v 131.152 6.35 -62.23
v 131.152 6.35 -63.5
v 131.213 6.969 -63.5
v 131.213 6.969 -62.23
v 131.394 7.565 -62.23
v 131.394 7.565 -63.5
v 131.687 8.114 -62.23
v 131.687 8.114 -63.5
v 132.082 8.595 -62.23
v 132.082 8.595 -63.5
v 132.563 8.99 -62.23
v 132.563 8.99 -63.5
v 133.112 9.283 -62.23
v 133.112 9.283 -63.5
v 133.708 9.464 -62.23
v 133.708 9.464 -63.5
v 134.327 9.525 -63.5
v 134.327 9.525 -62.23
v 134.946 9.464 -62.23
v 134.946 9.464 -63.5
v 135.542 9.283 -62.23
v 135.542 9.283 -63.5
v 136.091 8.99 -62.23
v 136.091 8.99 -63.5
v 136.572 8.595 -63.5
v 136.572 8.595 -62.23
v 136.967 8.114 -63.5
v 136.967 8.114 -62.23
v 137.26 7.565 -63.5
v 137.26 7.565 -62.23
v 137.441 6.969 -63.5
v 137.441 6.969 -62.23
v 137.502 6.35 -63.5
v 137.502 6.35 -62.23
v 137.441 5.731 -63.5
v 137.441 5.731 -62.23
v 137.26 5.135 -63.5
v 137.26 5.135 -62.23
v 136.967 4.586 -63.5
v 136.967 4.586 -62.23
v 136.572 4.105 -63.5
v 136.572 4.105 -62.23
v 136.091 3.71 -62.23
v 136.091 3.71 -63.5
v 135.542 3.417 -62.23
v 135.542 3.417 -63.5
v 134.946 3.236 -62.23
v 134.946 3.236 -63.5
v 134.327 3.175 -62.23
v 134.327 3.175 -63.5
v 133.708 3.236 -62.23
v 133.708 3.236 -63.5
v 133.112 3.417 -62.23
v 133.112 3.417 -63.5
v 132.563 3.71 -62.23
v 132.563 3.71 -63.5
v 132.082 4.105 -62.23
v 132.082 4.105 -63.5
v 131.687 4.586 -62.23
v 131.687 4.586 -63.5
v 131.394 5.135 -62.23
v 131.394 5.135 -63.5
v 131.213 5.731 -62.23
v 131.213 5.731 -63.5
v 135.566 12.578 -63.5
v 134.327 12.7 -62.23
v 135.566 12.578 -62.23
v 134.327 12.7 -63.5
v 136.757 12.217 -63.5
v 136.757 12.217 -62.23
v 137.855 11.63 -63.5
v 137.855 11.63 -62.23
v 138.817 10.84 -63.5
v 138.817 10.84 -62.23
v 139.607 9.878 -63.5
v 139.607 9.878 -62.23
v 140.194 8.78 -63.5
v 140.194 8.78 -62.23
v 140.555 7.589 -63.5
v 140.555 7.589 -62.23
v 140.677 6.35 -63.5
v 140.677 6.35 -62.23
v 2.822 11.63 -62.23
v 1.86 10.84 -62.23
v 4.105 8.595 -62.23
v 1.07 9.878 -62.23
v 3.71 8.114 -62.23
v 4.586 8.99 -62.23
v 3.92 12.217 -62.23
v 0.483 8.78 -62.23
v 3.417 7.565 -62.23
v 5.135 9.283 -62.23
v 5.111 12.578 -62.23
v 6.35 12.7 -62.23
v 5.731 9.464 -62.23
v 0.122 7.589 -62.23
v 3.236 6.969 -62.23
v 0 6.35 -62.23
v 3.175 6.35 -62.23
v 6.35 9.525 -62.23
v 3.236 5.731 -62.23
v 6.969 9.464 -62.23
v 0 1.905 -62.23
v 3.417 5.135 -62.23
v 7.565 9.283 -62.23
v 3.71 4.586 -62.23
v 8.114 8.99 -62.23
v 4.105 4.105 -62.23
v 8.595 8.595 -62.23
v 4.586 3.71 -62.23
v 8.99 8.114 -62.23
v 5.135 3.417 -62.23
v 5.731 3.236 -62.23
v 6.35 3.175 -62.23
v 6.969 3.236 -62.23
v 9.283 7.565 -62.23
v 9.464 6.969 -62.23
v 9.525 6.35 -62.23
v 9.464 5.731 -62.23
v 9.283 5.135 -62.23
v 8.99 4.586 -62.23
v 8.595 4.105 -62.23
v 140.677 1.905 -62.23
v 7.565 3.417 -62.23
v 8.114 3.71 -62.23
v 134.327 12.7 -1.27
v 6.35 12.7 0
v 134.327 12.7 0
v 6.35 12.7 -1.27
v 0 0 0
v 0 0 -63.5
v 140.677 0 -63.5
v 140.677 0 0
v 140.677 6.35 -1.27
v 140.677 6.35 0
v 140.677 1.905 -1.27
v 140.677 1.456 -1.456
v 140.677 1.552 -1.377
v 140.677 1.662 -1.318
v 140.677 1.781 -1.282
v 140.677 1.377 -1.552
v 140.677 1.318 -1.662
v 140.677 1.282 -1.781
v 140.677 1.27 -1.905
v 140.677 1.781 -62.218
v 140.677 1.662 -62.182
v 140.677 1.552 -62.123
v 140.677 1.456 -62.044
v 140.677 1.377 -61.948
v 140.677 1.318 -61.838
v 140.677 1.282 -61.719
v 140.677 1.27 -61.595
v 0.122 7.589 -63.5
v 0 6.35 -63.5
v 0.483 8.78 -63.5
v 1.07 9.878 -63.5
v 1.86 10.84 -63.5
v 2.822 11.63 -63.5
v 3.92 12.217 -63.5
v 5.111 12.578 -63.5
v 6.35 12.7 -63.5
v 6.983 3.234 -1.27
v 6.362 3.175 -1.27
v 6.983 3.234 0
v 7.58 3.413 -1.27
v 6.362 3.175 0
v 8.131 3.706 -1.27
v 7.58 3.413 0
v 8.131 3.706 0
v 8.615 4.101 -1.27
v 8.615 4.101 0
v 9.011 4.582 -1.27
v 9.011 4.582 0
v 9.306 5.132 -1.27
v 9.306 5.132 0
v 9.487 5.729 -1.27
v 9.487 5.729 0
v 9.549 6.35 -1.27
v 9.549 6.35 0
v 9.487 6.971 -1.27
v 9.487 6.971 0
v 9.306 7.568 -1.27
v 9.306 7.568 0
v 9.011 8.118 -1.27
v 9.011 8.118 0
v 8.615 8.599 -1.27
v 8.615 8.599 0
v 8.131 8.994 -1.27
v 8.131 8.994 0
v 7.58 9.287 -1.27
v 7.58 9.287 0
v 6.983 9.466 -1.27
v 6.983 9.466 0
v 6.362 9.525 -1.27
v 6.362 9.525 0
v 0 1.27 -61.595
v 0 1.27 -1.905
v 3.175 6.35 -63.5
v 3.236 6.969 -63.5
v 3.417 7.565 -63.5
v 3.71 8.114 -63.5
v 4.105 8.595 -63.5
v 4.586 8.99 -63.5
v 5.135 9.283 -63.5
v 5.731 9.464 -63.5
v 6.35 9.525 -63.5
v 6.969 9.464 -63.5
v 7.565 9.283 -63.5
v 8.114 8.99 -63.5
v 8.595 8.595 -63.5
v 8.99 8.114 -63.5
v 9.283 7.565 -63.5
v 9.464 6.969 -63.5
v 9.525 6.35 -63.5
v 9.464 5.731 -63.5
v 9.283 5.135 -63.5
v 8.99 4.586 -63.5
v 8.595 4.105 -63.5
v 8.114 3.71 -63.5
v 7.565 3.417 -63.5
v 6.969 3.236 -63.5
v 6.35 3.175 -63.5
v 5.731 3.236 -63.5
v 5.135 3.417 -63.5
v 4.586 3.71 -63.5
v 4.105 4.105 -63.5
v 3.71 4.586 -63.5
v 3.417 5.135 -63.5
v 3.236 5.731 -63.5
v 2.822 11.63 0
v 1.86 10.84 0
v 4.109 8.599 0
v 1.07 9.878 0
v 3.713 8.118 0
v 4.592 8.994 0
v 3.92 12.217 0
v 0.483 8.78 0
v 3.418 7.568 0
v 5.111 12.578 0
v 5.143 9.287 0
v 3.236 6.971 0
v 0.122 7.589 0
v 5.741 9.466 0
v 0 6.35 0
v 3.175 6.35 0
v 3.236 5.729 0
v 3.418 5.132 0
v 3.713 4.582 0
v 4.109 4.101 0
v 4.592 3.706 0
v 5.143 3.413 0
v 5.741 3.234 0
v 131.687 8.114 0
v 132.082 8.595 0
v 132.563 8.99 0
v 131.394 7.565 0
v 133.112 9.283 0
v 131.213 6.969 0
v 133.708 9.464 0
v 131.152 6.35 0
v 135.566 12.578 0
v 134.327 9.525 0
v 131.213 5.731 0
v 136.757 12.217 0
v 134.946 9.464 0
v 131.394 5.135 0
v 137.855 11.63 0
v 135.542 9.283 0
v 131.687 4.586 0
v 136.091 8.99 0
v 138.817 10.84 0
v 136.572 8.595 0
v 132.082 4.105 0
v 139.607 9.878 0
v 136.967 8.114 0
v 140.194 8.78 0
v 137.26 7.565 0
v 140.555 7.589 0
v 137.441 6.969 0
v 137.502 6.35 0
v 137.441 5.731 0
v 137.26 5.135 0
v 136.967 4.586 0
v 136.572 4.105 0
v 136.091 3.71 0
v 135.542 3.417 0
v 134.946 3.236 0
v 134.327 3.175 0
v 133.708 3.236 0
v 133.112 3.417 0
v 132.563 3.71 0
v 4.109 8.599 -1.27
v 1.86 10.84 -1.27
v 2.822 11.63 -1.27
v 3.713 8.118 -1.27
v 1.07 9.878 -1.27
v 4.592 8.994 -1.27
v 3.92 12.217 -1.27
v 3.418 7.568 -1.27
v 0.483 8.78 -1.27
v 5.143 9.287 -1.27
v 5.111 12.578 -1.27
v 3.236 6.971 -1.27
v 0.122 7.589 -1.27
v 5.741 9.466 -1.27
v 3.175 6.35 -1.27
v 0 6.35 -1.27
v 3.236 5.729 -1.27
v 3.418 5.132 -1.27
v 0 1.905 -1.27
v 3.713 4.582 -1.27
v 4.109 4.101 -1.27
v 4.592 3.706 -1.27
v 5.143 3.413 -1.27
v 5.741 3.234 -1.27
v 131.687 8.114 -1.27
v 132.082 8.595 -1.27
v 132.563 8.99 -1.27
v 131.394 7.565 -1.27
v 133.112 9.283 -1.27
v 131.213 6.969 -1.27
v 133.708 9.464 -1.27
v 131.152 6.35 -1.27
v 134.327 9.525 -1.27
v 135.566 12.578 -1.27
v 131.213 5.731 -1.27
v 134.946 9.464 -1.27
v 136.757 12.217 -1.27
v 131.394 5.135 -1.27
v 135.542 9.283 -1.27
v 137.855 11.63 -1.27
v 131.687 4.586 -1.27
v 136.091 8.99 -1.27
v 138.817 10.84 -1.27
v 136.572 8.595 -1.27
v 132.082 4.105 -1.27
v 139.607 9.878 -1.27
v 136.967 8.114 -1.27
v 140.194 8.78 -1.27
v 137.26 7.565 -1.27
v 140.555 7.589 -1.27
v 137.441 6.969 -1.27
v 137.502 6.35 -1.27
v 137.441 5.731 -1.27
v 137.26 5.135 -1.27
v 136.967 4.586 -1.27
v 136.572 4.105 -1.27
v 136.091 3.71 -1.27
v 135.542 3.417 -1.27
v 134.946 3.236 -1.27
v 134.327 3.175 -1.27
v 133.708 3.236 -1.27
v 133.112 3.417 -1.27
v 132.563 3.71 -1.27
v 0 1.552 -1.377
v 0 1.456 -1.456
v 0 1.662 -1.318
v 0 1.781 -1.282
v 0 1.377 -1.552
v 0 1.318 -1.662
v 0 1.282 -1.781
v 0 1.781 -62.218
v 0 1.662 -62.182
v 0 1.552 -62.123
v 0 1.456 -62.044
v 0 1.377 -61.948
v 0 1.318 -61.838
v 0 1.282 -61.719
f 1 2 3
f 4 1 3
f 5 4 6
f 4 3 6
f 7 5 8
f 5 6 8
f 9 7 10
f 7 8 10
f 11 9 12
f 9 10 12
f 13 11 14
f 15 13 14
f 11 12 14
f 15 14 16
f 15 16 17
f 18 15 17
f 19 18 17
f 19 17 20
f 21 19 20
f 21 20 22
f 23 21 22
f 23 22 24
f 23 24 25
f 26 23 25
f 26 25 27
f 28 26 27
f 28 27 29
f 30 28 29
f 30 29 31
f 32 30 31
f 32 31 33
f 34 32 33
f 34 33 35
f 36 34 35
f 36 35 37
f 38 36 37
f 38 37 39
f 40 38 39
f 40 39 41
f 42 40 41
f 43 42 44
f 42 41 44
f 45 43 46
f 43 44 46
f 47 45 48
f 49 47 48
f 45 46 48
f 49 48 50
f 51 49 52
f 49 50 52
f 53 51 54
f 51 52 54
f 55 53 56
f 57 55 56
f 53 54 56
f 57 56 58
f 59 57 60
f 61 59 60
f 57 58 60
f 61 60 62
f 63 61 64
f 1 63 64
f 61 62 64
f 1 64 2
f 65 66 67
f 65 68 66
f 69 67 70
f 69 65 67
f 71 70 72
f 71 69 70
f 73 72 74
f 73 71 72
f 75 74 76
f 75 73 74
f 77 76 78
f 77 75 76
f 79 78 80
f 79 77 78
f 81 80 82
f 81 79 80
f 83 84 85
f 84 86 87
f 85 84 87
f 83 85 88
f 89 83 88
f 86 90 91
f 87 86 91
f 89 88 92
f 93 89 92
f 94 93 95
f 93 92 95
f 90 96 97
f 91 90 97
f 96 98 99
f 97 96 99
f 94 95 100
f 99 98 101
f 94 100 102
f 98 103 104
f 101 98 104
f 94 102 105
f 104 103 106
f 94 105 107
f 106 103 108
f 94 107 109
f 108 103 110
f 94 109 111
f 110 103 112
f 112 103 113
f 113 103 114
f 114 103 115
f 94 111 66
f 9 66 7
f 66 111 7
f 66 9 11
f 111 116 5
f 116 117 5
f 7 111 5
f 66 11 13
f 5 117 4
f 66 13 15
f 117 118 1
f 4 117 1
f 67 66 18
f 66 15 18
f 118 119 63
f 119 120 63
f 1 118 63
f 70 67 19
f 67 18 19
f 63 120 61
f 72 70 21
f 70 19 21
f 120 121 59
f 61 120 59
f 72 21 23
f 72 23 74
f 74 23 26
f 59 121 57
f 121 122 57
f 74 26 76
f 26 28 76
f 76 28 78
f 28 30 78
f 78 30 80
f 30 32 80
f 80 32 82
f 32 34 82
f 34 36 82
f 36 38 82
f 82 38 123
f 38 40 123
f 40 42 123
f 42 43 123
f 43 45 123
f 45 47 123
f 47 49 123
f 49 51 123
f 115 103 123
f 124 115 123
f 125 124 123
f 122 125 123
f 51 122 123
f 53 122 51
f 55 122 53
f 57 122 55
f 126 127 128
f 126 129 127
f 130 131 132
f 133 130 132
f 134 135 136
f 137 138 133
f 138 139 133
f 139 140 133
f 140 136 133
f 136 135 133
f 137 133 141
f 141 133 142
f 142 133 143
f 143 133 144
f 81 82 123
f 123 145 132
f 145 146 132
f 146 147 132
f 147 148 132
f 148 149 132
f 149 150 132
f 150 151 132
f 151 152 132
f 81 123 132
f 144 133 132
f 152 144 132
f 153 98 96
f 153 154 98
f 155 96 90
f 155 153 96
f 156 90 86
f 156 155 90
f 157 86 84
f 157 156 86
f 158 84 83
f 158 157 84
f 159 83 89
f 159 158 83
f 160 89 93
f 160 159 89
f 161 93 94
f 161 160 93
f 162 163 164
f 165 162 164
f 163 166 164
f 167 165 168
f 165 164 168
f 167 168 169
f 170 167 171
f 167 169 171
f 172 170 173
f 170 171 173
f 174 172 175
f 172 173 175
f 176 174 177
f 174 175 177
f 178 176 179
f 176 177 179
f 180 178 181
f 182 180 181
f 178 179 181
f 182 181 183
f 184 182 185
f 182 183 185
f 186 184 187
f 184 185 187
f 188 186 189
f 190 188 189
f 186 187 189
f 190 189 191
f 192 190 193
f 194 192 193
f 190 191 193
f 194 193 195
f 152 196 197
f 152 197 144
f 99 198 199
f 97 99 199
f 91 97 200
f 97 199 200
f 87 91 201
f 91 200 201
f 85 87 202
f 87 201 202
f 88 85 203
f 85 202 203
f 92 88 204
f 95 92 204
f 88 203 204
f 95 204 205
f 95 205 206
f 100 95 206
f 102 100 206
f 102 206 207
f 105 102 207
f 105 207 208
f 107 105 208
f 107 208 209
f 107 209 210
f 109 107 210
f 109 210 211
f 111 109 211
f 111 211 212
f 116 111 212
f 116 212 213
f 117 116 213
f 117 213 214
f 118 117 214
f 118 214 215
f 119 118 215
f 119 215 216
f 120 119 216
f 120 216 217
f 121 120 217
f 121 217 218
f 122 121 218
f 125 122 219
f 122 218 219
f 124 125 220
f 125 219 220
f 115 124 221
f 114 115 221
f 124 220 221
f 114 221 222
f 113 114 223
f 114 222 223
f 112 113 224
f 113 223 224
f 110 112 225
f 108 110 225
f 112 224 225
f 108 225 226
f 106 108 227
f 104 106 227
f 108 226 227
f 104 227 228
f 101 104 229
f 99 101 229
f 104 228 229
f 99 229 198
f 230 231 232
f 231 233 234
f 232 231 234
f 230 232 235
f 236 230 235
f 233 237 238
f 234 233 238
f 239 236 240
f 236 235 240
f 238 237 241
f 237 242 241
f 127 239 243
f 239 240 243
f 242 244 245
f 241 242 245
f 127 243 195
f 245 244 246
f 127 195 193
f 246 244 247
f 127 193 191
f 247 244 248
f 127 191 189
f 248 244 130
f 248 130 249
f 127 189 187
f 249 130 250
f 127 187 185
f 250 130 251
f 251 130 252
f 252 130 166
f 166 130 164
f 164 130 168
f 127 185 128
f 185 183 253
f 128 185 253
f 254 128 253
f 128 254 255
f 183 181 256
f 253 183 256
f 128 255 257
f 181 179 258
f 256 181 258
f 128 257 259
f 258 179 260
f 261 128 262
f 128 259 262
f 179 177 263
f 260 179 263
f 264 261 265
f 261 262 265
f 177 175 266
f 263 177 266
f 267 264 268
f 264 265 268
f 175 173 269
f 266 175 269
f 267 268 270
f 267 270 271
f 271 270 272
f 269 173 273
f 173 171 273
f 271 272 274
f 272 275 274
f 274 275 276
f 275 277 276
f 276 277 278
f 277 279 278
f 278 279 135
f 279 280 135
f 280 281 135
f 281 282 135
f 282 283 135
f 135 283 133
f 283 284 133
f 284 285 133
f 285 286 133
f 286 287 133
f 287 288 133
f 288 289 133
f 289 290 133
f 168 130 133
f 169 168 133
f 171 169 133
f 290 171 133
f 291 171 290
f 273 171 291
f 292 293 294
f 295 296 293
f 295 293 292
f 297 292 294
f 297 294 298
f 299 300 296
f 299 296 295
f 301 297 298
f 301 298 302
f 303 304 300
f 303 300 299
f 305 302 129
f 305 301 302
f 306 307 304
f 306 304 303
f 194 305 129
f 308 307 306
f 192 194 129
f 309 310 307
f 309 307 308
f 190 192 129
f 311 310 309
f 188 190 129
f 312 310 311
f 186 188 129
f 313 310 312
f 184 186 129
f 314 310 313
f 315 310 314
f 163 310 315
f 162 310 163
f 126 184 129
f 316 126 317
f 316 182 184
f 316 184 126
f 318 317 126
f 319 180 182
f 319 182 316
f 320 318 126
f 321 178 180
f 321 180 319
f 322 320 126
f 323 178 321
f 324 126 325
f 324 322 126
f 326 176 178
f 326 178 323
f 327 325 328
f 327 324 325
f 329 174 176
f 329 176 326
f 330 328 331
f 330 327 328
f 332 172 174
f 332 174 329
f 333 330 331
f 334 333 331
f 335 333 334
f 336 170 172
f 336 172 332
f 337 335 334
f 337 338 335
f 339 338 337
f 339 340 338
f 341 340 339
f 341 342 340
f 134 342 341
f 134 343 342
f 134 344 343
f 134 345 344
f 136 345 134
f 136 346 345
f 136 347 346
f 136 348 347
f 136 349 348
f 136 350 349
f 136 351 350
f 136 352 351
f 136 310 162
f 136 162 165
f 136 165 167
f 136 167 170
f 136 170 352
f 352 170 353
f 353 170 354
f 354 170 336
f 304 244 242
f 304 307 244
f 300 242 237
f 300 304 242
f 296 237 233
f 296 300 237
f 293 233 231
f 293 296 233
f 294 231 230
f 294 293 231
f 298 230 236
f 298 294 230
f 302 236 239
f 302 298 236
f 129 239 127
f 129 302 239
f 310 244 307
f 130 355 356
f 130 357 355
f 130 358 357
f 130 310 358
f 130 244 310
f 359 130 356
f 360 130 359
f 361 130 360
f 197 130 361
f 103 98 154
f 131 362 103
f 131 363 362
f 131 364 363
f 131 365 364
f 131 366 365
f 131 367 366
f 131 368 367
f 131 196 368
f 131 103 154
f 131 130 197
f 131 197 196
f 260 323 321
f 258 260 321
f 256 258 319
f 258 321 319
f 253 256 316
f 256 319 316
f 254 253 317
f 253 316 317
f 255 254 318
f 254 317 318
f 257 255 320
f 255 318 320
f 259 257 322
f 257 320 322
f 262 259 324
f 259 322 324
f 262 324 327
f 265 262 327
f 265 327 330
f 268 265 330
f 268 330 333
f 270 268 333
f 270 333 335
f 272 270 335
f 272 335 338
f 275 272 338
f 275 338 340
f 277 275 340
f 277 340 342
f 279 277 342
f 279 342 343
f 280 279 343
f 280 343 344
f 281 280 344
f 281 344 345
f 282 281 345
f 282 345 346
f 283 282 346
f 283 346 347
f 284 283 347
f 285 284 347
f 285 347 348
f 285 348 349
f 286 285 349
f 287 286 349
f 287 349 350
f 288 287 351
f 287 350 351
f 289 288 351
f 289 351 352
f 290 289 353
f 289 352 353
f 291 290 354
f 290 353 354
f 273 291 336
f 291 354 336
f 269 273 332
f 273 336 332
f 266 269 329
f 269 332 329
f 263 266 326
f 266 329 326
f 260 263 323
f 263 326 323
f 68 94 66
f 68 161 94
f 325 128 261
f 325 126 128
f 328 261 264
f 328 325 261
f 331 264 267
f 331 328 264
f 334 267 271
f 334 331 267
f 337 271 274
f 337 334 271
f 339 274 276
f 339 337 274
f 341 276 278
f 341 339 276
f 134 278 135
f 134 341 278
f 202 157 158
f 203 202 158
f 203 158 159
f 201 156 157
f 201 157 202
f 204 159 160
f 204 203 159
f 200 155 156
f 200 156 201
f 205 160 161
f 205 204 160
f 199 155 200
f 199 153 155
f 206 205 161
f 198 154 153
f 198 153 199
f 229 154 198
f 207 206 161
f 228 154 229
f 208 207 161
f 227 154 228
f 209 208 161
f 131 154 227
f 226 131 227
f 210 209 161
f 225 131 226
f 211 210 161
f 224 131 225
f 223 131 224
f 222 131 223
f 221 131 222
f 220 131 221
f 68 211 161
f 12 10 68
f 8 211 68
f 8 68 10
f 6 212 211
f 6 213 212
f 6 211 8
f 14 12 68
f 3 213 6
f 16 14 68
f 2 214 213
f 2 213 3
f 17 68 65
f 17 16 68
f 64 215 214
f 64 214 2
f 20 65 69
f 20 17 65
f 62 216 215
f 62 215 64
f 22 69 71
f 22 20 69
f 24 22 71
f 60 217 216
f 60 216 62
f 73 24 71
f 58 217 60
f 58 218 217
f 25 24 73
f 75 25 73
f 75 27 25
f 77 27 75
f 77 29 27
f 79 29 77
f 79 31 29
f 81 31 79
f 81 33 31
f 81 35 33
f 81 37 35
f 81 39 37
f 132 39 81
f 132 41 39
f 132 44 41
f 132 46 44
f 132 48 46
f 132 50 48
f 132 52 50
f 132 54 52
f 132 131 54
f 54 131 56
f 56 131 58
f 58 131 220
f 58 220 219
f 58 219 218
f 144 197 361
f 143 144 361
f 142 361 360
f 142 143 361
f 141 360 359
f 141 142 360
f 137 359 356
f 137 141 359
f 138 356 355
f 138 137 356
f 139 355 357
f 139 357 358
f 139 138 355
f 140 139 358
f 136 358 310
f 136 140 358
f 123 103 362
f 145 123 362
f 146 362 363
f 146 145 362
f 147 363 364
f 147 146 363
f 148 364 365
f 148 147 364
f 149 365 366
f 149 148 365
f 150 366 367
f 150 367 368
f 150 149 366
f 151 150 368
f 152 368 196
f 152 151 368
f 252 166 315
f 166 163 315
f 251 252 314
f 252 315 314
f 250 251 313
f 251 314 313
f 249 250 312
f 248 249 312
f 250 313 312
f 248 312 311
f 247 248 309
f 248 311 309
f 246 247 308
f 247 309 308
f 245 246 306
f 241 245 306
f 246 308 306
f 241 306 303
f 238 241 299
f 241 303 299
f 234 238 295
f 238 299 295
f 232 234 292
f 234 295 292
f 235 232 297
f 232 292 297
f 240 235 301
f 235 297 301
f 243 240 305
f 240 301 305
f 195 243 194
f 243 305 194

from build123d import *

# Parameters (mm, degrees)
SKETCH1_W           = 140.676923077
SKETCH1_H           = 1.27
BOSS_EXTRUDE1_DEPTH = 12.7
SKETCH1_3_W         = 140.676923077
SKETCH1_3_H         = 60.96
BOSS_EXTRUDE2_DEPTH = 1.27
SKETCH2_R           = 3.175
CUT_EXTRUDE1_DEPTH  = 508
SKETCH1_5_W         = 140.676923077
SKETCH1_5_H         = 1.27
BOSS_EXTRUDE3_DEPTH = 12.7
SKETCH3_R           = 3.175
CUT_EXTRUDE2_DEPTH  = 12.7
FILLET1_R           = 6.35
FILLET2_R           = 0.635
SKETCH3_2_R         = 3.175
CUT_EXTRUDE3_DEPTH  = 155.866189617


with BuildPart() as part:
    # Sketch1 → Boss-Extrude1 (new body)
    with BuildSketch(Plane(origin=(0, 0, 0), x_dir=(1, 0, 0), z_dir=(0, 1, 0))):
        with Locations((70.338461538, 0.635)):
            Rectangle(SKETCH1_W, SKETCH1_H)
    extrude(amount=BOSS_EXTRUDE1_DEPTH)

    # Sketch1<3> → Boss-Extrude2 (add)
    with BuildSketch(Plane(origin=(0, 0, 0), x_dir=(1, 0, 0), z_dir=(0, 1, 0))):
        with Locations((70.338461538, 31.75)):
            Rectangle(SKETCH1_3_W, SKETCH1_3_H)
    extrude(amount=BOSS_EXTRUDE2_DEPTH)

    # Sketch2 → Cut-Extrude1 (cut)
    with BuildSketch(Plane.XY):
        with Locations((6.37364392, 6.35)):
            Circle(SKETCH2_R)
        with Locations((146.05, 6.35)):
            Circle(SKETCH2_R)
    extrude(amount=-CUT_EXTRUDE1_DEPTH, mode=Mode.SUBTRACT)

    # Sketch1<5> → Boss-Extrude3 (add)
    with BuildSketch(Plane(origin=(0, 0, 0), x_dir=(1, 0, 0), z_dir=(0, 1, 0))):
        with Locations((70.338461538, 62.865)):
            Rectangle(SKETCH1_5_W, SKETCH1_5_H)
    extrude(amount=BOSS_EXTRUDE3_DEPTH)

    # Sketch3 → Cut-Extrude2 (cut)
    with BuildSketch(Plane(origin=(0, 0, -63.5), x_dir=(-1, 0, 0), z_dir=(0, 0, -1))):
        with Locations((-6.35, 6.35)):
            Circle(SKETCH3_R)
        with Locations((-146.05, 6.35)):
            Circle(SKETCH3_R)
        with Locations((-134.326923077, 6.35)):
            Circle(SKETCH3_R)
    extrude(amount=-CUT_EXTRUDE2_DEPTH, mode=Mode.SUBTRACT)

    # Fillet1
    fillet1_edges = [part.edges().sort_by_distance(p)[0] for p in [
        (0, 12.7, -0.635),
        (140.676923077, 12.7, -0.635),
        (0, 12.7, -62.865),
        (140.676923077, 12.7, -62.865),
    ]]
    fillet(fillet1_edges, radius=FILLET1_R)

    # Fillet2
    fillet2_edges = [part.edges().sort_by_distance(p)[0] for p in [
        (70.338461538, 1.27, -62.23),
        (70.338461538, 1.27, -1.27),
    ]]
    fillet(fillet2_edges, radius=FILLET2_R)

    # Sketch3<2> → Cut-Extrude3 (cut, through all)
    with BuildSketch(Plane(origin=(0, 0, -63.5), x_dir=(-1, 0, 0), z_dir=(0, 0, -1))):
        with Locations((-6.35, 6.35)):
            Circle(SKETCH3_2_R)
        with Locations((-146.05, 6.35)):
            Circle(SKETCH3_2_R)
        with Locations((-134.326923077, 6.35)):
            Circle(SKETCH3_2_R)
    extrude(amount=-CUT_EXTRUDE3_DEPTH, mode=Mode.SUBTRACT)


solid = part.part
